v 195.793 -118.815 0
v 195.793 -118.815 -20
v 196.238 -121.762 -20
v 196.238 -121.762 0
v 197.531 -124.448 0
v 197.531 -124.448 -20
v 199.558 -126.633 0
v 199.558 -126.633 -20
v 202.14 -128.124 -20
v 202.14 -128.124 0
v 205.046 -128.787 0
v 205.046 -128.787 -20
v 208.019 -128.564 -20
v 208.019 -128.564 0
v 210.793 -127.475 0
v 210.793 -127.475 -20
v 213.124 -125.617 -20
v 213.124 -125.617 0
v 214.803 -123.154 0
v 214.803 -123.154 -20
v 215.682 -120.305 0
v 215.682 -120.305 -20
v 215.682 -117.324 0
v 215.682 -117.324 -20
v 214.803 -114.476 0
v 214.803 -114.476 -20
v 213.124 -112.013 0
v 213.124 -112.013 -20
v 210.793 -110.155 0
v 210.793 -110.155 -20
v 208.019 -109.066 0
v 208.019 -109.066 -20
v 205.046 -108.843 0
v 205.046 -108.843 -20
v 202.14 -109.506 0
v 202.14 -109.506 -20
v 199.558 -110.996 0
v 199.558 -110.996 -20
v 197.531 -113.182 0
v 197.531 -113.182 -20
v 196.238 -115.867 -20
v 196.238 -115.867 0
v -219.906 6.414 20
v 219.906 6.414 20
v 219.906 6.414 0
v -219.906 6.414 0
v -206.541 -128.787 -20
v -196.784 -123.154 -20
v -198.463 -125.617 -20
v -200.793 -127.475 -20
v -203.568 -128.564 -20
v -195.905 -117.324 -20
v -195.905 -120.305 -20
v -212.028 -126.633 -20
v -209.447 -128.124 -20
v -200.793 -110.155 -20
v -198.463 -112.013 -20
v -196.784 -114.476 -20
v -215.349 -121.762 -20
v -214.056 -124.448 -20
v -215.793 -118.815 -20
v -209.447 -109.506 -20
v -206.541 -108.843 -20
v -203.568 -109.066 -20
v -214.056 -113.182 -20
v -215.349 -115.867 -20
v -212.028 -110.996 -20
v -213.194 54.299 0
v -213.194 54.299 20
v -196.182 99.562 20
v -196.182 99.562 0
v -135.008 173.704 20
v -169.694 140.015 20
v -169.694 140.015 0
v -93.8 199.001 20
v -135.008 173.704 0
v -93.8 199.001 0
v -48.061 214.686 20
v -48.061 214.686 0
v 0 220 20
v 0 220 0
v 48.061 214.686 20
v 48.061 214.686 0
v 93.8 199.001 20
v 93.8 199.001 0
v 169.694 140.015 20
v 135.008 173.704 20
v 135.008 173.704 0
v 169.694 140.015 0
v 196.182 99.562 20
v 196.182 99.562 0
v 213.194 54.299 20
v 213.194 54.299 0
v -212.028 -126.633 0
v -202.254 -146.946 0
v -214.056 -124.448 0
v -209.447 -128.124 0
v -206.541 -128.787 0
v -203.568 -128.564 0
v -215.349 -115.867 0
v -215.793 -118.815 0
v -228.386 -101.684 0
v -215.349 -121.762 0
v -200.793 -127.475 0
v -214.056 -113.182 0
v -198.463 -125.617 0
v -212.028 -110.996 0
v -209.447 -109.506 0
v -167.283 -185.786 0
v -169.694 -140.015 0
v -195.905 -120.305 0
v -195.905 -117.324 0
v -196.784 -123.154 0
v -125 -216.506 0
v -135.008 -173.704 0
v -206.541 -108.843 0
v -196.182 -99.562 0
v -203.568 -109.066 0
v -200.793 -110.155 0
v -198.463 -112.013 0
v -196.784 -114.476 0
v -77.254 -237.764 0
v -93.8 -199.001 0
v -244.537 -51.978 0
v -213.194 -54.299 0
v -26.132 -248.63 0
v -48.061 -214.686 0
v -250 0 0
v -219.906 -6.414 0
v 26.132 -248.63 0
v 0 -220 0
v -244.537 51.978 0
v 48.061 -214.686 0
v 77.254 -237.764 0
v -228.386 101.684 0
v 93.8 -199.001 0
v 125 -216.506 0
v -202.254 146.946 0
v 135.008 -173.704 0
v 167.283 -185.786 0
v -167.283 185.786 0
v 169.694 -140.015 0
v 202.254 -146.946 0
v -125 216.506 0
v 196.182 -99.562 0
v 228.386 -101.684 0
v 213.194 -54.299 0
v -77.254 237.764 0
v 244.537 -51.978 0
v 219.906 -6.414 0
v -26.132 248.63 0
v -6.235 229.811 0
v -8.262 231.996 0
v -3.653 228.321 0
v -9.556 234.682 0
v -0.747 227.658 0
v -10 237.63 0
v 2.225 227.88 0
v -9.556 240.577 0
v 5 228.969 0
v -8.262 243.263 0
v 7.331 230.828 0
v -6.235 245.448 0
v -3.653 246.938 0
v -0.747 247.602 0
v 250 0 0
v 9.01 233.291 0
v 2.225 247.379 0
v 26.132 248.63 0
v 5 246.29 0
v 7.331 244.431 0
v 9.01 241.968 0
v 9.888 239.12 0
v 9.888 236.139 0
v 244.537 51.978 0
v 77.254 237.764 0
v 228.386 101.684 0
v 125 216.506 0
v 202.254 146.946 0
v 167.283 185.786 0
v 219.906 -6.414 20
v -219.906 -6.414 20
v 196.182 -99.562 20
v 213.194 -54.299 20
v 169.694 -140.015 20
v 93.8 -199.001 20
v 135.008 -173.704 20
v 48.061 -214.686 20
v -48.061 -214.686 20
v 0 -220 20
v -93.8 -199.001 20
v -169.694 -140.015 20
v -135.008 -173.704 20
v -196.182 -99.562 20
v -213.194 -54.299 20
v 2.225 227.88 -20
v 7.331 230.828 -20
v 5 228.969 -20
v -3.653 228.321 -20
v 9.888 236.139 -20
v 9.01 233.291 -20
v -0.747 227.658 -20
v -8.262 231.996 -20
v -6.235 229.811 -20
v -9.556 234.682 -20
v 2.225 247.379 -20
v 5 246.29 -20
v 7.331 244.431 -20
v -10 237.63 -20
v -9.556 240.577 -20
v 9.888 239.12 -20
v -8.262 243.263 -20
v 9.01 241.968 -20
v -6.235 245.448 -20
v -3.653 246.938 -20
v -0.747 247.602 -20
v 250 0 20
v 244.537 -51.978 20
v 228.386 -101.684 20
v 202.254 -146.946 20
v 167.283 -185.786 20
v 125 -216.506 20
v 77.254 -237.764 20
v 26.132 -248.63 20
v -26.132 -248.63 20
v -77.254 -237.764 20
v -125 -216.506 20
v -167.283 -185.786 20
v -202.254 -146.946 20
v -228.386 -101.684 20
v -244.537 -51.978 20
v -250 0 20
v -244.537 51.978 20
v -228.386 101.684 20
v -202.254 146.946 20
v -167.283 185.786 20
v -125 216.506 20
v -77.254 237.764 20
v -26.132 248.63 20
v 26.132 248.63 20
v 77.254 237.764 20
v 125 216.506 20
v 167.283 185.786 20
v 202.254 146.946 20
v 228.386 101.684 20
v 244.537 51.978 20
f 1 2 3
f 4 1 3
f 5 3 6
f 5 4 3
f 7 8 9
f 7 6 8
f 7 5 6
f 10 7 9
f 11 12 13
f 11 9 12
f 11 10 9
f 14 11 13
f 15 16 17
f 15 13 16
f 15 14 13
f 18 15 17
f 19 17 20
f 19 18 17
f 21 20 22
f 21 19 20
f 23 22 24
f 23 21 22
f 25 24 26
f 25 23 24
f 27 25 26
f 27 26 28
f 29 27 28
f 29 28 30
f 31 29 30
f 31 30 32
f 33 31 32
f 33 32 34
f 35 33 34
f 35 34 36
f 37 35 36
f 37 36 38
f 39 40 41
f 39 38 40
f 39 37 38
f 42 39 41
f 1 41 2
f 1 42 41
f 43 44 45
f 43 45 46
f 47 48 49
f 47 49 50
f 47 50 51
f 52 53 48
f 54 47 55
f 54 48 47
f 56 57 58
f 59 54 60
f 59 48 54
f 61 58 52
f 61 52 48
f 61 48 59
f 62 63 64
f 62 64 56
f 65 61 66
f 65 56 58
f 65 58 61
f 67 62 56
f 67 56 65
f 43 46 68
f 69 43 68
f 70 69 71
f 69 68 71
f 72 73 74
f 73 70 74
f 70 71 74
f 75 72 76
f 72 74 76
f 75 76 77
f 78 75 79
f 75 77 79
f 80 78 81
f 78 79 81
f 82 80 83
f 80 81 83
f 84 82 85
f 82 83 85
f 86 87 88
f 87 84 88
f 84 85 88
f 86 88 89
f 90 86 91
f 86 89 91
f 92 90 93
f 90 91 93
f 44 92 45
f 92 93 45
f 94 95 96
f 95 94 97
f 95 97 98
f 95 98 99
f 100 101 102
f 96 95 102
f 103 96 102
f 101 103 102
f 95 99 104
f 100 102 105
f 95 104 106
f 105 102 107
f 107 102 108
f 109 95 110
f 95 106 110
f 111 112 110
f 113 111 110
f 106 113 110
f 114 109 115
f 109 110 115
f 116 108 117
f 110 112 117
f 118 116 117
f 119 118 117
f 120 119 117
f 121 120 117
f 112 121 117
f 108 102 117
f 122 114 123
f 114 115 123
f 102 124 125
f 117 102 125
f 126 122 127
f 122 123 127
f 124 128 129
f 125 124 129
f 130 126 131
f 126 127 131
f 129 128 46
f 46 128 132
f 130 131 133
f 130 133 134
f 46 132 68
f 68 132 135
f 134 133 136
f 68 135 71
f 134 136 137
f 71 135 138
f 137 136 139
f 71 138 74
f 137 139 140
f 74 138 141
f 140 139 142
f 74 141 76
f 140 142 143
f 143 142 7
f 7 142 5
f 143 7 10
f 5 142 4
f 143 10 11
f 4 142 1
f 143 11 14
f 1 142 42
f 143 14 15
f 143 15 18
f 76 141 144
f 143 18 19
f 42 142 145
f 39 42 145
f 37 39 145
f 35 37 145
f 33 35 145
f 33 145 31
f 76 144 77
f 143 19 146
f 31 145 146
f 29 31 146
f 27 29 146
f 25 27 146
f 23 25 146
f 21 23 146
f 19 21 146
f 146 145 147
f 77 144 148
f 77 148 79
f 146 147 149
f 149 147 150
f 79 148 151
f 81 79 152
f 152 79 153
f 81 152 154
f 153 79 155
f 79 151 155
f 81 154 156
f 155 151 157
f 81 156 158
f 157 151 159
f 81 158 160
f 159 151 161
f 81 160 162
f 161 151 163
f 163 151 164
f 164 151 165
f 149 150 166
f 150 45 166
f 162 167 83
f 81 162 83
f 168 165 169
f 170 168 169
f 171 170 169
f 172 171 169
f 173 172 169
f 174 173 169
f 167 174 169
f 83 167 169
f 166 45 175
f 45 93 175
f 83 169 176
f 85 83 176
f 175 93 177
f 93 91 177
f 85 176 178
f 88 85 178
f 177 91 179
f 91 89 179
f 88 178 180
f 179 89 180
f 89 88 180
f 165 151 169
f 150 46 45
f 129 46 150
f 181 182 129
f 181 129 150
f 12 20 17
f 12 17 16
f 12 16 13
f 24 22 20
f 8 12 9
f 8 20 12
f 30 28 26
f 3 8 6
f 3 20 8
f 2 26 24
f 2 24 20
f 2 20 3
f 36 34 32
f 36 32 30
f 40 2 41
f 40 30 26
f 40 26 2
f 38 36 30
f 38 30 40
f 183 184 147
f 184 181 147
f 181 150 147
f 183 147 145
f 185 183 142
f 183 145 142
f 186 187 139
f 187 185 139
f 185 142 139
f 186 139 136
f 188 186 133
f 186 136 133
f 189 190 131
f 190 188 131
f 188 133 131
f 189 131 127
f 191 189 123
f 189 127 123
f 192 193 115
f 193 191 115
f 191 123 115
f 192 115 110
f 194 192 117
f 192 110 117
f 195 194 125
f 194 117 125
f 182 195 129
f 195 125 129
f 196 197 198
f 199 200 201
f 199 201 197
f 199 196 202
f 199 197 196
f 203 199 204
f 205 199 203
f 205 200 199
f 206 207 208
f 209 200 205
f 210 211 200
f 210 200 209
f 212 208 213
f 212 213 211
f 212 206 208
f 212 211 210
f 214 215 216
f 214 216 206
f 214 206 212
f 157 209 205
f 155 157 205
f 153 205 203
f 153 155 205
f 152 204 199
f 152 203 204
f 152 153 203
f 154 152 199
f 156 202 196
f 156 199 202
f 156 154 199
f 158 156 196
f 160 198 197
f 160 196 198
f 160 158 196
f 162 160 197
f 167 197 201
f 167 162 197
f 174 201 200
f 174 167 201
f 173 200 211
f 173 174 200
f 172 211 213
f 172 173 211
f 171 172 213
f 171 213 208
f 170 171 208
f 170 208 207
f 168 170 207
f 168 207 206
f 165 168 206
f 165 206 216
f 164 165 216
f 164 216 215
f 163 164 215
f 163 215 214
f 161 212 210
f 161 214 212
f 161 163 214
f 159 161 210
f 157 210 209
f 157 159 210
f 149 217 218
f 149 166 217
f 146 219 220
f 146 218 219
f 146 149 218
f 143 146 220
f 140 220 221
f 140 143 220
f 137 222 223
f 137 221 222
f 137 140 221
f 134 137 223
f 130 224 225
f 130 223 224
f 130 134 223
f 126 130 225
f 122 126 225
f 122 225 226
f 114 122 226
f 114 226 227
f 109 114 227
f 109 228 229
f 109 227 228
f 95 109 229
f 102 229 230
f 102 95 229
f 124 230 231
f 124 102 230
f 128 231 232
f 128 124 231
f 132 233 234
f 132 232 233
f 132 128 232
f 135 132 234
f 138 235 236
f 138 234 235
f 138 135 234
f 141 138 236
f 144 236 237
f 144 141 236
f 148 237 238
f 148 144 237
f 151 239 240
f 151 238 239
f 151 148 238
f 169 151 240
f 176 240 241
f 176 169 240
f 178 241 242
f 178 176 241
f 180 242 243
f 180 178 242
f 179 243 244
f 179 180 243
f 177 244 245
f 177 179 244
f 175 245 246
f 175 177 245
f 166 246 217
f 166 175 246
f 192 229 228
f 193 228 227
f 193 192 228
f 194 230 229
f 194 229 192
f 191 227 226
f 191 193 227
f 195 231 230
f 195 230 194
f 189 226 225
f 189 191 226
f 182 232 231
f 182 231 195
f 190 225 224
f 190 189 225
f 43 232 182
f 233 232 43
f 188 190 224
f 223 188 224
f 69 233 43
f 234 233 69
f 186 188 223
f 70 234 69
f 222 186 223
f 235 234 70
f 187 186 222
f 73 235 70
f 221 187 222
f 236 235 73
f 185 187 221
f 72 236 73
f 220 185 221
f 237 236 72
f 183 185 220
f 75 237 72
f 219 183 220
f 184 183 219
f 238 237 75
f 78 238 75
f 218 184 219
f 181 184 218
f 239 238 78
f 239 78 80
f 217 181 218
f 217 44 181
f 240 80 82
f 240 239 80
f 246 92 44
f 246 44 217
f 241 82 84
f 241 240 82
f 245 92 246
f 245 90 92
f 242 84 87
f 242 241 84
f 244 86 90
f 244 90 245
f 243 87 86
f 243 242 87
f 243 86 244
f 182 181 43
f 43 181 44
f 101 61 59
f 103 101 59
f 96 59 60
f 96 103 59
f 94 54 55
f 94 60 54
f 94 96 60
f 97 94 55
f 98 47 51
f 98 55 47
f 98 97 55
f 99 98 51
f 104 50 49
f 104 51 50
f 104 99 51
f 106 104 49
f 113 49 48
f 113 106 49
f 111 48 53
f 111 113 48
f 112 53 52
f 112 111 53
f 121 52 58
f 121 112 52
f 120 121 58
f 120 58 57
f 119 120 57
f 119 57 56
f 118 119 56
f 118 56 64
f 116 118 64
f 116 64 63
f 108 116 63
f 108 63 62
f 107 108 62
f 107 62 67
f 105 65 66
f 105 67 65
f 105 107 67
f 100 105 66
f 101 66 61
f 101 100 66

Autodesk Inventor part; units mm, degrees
ref_plane "YZ Plane" through (0, 0, 0) normal (1, 0, 0) x (0, 1, 0)
ref_plane "XZ Plane" through (0, 0, 0) normal (0, 1, 0) x (-1, 0, 0)
ref_plane "XY Plane" through (0, 0, 0) normal (0, 0, 1) x (1, 0, 0)
sketch "Sketch1" plane through (0, 0, 0) normal (0, 0, 1) x (1, 0, 0)
  circle A0 centre (0, 0) radius 250
  circle A1 centre (0, 0) radius 220
  dimension "d0" = 500
  dimension "d1" = 30
extrude "Extrusion1" add sketch "Sketch1" along normal blind 20
sketch "Sketch2" plane through (0, 0, 0) normal (0, 0, -1) x (-1, 0, 0)
  circle A0 centre (0, 237.6296) radius 10
  circle A1 centre (-205.7933, -118.8148) radius 10
  circle A2 centre (205.7933, -118.8148) radius 10
  point P0 (0, 0)
  dimension "d4" = 20
  dimension "d7" = 360
extrude "Extrusion2" add sketch "Sketch2" along normal blind 20
sketch "Sketch4" plane through (0, 0, 20) normal (0, 0, 1) x (1, 0, 0)
  line L0 (-238.2034, -6.414) -> (238.2034, -6.414)
  line L1 (238.2034, -6.414) -> (238.2034, 6.414)
  line L2 (238.2034, 6.414) -> (-238.2034, 6.414)
  line L3 (-238.2034, 6.414) -> (-238.2034, -6.414)
  line L4 (-238.2034, -6.414) -> (238.2034, 6.414) construction
  line L5 (238.2034, -6.414) -> (-238.2034, 6.414) construction
  point P0 (0, 0)
extrude "Extrusion3" add sketch "Sketch4" against normal blind 20
properties part number "platforma" material "Steel"
